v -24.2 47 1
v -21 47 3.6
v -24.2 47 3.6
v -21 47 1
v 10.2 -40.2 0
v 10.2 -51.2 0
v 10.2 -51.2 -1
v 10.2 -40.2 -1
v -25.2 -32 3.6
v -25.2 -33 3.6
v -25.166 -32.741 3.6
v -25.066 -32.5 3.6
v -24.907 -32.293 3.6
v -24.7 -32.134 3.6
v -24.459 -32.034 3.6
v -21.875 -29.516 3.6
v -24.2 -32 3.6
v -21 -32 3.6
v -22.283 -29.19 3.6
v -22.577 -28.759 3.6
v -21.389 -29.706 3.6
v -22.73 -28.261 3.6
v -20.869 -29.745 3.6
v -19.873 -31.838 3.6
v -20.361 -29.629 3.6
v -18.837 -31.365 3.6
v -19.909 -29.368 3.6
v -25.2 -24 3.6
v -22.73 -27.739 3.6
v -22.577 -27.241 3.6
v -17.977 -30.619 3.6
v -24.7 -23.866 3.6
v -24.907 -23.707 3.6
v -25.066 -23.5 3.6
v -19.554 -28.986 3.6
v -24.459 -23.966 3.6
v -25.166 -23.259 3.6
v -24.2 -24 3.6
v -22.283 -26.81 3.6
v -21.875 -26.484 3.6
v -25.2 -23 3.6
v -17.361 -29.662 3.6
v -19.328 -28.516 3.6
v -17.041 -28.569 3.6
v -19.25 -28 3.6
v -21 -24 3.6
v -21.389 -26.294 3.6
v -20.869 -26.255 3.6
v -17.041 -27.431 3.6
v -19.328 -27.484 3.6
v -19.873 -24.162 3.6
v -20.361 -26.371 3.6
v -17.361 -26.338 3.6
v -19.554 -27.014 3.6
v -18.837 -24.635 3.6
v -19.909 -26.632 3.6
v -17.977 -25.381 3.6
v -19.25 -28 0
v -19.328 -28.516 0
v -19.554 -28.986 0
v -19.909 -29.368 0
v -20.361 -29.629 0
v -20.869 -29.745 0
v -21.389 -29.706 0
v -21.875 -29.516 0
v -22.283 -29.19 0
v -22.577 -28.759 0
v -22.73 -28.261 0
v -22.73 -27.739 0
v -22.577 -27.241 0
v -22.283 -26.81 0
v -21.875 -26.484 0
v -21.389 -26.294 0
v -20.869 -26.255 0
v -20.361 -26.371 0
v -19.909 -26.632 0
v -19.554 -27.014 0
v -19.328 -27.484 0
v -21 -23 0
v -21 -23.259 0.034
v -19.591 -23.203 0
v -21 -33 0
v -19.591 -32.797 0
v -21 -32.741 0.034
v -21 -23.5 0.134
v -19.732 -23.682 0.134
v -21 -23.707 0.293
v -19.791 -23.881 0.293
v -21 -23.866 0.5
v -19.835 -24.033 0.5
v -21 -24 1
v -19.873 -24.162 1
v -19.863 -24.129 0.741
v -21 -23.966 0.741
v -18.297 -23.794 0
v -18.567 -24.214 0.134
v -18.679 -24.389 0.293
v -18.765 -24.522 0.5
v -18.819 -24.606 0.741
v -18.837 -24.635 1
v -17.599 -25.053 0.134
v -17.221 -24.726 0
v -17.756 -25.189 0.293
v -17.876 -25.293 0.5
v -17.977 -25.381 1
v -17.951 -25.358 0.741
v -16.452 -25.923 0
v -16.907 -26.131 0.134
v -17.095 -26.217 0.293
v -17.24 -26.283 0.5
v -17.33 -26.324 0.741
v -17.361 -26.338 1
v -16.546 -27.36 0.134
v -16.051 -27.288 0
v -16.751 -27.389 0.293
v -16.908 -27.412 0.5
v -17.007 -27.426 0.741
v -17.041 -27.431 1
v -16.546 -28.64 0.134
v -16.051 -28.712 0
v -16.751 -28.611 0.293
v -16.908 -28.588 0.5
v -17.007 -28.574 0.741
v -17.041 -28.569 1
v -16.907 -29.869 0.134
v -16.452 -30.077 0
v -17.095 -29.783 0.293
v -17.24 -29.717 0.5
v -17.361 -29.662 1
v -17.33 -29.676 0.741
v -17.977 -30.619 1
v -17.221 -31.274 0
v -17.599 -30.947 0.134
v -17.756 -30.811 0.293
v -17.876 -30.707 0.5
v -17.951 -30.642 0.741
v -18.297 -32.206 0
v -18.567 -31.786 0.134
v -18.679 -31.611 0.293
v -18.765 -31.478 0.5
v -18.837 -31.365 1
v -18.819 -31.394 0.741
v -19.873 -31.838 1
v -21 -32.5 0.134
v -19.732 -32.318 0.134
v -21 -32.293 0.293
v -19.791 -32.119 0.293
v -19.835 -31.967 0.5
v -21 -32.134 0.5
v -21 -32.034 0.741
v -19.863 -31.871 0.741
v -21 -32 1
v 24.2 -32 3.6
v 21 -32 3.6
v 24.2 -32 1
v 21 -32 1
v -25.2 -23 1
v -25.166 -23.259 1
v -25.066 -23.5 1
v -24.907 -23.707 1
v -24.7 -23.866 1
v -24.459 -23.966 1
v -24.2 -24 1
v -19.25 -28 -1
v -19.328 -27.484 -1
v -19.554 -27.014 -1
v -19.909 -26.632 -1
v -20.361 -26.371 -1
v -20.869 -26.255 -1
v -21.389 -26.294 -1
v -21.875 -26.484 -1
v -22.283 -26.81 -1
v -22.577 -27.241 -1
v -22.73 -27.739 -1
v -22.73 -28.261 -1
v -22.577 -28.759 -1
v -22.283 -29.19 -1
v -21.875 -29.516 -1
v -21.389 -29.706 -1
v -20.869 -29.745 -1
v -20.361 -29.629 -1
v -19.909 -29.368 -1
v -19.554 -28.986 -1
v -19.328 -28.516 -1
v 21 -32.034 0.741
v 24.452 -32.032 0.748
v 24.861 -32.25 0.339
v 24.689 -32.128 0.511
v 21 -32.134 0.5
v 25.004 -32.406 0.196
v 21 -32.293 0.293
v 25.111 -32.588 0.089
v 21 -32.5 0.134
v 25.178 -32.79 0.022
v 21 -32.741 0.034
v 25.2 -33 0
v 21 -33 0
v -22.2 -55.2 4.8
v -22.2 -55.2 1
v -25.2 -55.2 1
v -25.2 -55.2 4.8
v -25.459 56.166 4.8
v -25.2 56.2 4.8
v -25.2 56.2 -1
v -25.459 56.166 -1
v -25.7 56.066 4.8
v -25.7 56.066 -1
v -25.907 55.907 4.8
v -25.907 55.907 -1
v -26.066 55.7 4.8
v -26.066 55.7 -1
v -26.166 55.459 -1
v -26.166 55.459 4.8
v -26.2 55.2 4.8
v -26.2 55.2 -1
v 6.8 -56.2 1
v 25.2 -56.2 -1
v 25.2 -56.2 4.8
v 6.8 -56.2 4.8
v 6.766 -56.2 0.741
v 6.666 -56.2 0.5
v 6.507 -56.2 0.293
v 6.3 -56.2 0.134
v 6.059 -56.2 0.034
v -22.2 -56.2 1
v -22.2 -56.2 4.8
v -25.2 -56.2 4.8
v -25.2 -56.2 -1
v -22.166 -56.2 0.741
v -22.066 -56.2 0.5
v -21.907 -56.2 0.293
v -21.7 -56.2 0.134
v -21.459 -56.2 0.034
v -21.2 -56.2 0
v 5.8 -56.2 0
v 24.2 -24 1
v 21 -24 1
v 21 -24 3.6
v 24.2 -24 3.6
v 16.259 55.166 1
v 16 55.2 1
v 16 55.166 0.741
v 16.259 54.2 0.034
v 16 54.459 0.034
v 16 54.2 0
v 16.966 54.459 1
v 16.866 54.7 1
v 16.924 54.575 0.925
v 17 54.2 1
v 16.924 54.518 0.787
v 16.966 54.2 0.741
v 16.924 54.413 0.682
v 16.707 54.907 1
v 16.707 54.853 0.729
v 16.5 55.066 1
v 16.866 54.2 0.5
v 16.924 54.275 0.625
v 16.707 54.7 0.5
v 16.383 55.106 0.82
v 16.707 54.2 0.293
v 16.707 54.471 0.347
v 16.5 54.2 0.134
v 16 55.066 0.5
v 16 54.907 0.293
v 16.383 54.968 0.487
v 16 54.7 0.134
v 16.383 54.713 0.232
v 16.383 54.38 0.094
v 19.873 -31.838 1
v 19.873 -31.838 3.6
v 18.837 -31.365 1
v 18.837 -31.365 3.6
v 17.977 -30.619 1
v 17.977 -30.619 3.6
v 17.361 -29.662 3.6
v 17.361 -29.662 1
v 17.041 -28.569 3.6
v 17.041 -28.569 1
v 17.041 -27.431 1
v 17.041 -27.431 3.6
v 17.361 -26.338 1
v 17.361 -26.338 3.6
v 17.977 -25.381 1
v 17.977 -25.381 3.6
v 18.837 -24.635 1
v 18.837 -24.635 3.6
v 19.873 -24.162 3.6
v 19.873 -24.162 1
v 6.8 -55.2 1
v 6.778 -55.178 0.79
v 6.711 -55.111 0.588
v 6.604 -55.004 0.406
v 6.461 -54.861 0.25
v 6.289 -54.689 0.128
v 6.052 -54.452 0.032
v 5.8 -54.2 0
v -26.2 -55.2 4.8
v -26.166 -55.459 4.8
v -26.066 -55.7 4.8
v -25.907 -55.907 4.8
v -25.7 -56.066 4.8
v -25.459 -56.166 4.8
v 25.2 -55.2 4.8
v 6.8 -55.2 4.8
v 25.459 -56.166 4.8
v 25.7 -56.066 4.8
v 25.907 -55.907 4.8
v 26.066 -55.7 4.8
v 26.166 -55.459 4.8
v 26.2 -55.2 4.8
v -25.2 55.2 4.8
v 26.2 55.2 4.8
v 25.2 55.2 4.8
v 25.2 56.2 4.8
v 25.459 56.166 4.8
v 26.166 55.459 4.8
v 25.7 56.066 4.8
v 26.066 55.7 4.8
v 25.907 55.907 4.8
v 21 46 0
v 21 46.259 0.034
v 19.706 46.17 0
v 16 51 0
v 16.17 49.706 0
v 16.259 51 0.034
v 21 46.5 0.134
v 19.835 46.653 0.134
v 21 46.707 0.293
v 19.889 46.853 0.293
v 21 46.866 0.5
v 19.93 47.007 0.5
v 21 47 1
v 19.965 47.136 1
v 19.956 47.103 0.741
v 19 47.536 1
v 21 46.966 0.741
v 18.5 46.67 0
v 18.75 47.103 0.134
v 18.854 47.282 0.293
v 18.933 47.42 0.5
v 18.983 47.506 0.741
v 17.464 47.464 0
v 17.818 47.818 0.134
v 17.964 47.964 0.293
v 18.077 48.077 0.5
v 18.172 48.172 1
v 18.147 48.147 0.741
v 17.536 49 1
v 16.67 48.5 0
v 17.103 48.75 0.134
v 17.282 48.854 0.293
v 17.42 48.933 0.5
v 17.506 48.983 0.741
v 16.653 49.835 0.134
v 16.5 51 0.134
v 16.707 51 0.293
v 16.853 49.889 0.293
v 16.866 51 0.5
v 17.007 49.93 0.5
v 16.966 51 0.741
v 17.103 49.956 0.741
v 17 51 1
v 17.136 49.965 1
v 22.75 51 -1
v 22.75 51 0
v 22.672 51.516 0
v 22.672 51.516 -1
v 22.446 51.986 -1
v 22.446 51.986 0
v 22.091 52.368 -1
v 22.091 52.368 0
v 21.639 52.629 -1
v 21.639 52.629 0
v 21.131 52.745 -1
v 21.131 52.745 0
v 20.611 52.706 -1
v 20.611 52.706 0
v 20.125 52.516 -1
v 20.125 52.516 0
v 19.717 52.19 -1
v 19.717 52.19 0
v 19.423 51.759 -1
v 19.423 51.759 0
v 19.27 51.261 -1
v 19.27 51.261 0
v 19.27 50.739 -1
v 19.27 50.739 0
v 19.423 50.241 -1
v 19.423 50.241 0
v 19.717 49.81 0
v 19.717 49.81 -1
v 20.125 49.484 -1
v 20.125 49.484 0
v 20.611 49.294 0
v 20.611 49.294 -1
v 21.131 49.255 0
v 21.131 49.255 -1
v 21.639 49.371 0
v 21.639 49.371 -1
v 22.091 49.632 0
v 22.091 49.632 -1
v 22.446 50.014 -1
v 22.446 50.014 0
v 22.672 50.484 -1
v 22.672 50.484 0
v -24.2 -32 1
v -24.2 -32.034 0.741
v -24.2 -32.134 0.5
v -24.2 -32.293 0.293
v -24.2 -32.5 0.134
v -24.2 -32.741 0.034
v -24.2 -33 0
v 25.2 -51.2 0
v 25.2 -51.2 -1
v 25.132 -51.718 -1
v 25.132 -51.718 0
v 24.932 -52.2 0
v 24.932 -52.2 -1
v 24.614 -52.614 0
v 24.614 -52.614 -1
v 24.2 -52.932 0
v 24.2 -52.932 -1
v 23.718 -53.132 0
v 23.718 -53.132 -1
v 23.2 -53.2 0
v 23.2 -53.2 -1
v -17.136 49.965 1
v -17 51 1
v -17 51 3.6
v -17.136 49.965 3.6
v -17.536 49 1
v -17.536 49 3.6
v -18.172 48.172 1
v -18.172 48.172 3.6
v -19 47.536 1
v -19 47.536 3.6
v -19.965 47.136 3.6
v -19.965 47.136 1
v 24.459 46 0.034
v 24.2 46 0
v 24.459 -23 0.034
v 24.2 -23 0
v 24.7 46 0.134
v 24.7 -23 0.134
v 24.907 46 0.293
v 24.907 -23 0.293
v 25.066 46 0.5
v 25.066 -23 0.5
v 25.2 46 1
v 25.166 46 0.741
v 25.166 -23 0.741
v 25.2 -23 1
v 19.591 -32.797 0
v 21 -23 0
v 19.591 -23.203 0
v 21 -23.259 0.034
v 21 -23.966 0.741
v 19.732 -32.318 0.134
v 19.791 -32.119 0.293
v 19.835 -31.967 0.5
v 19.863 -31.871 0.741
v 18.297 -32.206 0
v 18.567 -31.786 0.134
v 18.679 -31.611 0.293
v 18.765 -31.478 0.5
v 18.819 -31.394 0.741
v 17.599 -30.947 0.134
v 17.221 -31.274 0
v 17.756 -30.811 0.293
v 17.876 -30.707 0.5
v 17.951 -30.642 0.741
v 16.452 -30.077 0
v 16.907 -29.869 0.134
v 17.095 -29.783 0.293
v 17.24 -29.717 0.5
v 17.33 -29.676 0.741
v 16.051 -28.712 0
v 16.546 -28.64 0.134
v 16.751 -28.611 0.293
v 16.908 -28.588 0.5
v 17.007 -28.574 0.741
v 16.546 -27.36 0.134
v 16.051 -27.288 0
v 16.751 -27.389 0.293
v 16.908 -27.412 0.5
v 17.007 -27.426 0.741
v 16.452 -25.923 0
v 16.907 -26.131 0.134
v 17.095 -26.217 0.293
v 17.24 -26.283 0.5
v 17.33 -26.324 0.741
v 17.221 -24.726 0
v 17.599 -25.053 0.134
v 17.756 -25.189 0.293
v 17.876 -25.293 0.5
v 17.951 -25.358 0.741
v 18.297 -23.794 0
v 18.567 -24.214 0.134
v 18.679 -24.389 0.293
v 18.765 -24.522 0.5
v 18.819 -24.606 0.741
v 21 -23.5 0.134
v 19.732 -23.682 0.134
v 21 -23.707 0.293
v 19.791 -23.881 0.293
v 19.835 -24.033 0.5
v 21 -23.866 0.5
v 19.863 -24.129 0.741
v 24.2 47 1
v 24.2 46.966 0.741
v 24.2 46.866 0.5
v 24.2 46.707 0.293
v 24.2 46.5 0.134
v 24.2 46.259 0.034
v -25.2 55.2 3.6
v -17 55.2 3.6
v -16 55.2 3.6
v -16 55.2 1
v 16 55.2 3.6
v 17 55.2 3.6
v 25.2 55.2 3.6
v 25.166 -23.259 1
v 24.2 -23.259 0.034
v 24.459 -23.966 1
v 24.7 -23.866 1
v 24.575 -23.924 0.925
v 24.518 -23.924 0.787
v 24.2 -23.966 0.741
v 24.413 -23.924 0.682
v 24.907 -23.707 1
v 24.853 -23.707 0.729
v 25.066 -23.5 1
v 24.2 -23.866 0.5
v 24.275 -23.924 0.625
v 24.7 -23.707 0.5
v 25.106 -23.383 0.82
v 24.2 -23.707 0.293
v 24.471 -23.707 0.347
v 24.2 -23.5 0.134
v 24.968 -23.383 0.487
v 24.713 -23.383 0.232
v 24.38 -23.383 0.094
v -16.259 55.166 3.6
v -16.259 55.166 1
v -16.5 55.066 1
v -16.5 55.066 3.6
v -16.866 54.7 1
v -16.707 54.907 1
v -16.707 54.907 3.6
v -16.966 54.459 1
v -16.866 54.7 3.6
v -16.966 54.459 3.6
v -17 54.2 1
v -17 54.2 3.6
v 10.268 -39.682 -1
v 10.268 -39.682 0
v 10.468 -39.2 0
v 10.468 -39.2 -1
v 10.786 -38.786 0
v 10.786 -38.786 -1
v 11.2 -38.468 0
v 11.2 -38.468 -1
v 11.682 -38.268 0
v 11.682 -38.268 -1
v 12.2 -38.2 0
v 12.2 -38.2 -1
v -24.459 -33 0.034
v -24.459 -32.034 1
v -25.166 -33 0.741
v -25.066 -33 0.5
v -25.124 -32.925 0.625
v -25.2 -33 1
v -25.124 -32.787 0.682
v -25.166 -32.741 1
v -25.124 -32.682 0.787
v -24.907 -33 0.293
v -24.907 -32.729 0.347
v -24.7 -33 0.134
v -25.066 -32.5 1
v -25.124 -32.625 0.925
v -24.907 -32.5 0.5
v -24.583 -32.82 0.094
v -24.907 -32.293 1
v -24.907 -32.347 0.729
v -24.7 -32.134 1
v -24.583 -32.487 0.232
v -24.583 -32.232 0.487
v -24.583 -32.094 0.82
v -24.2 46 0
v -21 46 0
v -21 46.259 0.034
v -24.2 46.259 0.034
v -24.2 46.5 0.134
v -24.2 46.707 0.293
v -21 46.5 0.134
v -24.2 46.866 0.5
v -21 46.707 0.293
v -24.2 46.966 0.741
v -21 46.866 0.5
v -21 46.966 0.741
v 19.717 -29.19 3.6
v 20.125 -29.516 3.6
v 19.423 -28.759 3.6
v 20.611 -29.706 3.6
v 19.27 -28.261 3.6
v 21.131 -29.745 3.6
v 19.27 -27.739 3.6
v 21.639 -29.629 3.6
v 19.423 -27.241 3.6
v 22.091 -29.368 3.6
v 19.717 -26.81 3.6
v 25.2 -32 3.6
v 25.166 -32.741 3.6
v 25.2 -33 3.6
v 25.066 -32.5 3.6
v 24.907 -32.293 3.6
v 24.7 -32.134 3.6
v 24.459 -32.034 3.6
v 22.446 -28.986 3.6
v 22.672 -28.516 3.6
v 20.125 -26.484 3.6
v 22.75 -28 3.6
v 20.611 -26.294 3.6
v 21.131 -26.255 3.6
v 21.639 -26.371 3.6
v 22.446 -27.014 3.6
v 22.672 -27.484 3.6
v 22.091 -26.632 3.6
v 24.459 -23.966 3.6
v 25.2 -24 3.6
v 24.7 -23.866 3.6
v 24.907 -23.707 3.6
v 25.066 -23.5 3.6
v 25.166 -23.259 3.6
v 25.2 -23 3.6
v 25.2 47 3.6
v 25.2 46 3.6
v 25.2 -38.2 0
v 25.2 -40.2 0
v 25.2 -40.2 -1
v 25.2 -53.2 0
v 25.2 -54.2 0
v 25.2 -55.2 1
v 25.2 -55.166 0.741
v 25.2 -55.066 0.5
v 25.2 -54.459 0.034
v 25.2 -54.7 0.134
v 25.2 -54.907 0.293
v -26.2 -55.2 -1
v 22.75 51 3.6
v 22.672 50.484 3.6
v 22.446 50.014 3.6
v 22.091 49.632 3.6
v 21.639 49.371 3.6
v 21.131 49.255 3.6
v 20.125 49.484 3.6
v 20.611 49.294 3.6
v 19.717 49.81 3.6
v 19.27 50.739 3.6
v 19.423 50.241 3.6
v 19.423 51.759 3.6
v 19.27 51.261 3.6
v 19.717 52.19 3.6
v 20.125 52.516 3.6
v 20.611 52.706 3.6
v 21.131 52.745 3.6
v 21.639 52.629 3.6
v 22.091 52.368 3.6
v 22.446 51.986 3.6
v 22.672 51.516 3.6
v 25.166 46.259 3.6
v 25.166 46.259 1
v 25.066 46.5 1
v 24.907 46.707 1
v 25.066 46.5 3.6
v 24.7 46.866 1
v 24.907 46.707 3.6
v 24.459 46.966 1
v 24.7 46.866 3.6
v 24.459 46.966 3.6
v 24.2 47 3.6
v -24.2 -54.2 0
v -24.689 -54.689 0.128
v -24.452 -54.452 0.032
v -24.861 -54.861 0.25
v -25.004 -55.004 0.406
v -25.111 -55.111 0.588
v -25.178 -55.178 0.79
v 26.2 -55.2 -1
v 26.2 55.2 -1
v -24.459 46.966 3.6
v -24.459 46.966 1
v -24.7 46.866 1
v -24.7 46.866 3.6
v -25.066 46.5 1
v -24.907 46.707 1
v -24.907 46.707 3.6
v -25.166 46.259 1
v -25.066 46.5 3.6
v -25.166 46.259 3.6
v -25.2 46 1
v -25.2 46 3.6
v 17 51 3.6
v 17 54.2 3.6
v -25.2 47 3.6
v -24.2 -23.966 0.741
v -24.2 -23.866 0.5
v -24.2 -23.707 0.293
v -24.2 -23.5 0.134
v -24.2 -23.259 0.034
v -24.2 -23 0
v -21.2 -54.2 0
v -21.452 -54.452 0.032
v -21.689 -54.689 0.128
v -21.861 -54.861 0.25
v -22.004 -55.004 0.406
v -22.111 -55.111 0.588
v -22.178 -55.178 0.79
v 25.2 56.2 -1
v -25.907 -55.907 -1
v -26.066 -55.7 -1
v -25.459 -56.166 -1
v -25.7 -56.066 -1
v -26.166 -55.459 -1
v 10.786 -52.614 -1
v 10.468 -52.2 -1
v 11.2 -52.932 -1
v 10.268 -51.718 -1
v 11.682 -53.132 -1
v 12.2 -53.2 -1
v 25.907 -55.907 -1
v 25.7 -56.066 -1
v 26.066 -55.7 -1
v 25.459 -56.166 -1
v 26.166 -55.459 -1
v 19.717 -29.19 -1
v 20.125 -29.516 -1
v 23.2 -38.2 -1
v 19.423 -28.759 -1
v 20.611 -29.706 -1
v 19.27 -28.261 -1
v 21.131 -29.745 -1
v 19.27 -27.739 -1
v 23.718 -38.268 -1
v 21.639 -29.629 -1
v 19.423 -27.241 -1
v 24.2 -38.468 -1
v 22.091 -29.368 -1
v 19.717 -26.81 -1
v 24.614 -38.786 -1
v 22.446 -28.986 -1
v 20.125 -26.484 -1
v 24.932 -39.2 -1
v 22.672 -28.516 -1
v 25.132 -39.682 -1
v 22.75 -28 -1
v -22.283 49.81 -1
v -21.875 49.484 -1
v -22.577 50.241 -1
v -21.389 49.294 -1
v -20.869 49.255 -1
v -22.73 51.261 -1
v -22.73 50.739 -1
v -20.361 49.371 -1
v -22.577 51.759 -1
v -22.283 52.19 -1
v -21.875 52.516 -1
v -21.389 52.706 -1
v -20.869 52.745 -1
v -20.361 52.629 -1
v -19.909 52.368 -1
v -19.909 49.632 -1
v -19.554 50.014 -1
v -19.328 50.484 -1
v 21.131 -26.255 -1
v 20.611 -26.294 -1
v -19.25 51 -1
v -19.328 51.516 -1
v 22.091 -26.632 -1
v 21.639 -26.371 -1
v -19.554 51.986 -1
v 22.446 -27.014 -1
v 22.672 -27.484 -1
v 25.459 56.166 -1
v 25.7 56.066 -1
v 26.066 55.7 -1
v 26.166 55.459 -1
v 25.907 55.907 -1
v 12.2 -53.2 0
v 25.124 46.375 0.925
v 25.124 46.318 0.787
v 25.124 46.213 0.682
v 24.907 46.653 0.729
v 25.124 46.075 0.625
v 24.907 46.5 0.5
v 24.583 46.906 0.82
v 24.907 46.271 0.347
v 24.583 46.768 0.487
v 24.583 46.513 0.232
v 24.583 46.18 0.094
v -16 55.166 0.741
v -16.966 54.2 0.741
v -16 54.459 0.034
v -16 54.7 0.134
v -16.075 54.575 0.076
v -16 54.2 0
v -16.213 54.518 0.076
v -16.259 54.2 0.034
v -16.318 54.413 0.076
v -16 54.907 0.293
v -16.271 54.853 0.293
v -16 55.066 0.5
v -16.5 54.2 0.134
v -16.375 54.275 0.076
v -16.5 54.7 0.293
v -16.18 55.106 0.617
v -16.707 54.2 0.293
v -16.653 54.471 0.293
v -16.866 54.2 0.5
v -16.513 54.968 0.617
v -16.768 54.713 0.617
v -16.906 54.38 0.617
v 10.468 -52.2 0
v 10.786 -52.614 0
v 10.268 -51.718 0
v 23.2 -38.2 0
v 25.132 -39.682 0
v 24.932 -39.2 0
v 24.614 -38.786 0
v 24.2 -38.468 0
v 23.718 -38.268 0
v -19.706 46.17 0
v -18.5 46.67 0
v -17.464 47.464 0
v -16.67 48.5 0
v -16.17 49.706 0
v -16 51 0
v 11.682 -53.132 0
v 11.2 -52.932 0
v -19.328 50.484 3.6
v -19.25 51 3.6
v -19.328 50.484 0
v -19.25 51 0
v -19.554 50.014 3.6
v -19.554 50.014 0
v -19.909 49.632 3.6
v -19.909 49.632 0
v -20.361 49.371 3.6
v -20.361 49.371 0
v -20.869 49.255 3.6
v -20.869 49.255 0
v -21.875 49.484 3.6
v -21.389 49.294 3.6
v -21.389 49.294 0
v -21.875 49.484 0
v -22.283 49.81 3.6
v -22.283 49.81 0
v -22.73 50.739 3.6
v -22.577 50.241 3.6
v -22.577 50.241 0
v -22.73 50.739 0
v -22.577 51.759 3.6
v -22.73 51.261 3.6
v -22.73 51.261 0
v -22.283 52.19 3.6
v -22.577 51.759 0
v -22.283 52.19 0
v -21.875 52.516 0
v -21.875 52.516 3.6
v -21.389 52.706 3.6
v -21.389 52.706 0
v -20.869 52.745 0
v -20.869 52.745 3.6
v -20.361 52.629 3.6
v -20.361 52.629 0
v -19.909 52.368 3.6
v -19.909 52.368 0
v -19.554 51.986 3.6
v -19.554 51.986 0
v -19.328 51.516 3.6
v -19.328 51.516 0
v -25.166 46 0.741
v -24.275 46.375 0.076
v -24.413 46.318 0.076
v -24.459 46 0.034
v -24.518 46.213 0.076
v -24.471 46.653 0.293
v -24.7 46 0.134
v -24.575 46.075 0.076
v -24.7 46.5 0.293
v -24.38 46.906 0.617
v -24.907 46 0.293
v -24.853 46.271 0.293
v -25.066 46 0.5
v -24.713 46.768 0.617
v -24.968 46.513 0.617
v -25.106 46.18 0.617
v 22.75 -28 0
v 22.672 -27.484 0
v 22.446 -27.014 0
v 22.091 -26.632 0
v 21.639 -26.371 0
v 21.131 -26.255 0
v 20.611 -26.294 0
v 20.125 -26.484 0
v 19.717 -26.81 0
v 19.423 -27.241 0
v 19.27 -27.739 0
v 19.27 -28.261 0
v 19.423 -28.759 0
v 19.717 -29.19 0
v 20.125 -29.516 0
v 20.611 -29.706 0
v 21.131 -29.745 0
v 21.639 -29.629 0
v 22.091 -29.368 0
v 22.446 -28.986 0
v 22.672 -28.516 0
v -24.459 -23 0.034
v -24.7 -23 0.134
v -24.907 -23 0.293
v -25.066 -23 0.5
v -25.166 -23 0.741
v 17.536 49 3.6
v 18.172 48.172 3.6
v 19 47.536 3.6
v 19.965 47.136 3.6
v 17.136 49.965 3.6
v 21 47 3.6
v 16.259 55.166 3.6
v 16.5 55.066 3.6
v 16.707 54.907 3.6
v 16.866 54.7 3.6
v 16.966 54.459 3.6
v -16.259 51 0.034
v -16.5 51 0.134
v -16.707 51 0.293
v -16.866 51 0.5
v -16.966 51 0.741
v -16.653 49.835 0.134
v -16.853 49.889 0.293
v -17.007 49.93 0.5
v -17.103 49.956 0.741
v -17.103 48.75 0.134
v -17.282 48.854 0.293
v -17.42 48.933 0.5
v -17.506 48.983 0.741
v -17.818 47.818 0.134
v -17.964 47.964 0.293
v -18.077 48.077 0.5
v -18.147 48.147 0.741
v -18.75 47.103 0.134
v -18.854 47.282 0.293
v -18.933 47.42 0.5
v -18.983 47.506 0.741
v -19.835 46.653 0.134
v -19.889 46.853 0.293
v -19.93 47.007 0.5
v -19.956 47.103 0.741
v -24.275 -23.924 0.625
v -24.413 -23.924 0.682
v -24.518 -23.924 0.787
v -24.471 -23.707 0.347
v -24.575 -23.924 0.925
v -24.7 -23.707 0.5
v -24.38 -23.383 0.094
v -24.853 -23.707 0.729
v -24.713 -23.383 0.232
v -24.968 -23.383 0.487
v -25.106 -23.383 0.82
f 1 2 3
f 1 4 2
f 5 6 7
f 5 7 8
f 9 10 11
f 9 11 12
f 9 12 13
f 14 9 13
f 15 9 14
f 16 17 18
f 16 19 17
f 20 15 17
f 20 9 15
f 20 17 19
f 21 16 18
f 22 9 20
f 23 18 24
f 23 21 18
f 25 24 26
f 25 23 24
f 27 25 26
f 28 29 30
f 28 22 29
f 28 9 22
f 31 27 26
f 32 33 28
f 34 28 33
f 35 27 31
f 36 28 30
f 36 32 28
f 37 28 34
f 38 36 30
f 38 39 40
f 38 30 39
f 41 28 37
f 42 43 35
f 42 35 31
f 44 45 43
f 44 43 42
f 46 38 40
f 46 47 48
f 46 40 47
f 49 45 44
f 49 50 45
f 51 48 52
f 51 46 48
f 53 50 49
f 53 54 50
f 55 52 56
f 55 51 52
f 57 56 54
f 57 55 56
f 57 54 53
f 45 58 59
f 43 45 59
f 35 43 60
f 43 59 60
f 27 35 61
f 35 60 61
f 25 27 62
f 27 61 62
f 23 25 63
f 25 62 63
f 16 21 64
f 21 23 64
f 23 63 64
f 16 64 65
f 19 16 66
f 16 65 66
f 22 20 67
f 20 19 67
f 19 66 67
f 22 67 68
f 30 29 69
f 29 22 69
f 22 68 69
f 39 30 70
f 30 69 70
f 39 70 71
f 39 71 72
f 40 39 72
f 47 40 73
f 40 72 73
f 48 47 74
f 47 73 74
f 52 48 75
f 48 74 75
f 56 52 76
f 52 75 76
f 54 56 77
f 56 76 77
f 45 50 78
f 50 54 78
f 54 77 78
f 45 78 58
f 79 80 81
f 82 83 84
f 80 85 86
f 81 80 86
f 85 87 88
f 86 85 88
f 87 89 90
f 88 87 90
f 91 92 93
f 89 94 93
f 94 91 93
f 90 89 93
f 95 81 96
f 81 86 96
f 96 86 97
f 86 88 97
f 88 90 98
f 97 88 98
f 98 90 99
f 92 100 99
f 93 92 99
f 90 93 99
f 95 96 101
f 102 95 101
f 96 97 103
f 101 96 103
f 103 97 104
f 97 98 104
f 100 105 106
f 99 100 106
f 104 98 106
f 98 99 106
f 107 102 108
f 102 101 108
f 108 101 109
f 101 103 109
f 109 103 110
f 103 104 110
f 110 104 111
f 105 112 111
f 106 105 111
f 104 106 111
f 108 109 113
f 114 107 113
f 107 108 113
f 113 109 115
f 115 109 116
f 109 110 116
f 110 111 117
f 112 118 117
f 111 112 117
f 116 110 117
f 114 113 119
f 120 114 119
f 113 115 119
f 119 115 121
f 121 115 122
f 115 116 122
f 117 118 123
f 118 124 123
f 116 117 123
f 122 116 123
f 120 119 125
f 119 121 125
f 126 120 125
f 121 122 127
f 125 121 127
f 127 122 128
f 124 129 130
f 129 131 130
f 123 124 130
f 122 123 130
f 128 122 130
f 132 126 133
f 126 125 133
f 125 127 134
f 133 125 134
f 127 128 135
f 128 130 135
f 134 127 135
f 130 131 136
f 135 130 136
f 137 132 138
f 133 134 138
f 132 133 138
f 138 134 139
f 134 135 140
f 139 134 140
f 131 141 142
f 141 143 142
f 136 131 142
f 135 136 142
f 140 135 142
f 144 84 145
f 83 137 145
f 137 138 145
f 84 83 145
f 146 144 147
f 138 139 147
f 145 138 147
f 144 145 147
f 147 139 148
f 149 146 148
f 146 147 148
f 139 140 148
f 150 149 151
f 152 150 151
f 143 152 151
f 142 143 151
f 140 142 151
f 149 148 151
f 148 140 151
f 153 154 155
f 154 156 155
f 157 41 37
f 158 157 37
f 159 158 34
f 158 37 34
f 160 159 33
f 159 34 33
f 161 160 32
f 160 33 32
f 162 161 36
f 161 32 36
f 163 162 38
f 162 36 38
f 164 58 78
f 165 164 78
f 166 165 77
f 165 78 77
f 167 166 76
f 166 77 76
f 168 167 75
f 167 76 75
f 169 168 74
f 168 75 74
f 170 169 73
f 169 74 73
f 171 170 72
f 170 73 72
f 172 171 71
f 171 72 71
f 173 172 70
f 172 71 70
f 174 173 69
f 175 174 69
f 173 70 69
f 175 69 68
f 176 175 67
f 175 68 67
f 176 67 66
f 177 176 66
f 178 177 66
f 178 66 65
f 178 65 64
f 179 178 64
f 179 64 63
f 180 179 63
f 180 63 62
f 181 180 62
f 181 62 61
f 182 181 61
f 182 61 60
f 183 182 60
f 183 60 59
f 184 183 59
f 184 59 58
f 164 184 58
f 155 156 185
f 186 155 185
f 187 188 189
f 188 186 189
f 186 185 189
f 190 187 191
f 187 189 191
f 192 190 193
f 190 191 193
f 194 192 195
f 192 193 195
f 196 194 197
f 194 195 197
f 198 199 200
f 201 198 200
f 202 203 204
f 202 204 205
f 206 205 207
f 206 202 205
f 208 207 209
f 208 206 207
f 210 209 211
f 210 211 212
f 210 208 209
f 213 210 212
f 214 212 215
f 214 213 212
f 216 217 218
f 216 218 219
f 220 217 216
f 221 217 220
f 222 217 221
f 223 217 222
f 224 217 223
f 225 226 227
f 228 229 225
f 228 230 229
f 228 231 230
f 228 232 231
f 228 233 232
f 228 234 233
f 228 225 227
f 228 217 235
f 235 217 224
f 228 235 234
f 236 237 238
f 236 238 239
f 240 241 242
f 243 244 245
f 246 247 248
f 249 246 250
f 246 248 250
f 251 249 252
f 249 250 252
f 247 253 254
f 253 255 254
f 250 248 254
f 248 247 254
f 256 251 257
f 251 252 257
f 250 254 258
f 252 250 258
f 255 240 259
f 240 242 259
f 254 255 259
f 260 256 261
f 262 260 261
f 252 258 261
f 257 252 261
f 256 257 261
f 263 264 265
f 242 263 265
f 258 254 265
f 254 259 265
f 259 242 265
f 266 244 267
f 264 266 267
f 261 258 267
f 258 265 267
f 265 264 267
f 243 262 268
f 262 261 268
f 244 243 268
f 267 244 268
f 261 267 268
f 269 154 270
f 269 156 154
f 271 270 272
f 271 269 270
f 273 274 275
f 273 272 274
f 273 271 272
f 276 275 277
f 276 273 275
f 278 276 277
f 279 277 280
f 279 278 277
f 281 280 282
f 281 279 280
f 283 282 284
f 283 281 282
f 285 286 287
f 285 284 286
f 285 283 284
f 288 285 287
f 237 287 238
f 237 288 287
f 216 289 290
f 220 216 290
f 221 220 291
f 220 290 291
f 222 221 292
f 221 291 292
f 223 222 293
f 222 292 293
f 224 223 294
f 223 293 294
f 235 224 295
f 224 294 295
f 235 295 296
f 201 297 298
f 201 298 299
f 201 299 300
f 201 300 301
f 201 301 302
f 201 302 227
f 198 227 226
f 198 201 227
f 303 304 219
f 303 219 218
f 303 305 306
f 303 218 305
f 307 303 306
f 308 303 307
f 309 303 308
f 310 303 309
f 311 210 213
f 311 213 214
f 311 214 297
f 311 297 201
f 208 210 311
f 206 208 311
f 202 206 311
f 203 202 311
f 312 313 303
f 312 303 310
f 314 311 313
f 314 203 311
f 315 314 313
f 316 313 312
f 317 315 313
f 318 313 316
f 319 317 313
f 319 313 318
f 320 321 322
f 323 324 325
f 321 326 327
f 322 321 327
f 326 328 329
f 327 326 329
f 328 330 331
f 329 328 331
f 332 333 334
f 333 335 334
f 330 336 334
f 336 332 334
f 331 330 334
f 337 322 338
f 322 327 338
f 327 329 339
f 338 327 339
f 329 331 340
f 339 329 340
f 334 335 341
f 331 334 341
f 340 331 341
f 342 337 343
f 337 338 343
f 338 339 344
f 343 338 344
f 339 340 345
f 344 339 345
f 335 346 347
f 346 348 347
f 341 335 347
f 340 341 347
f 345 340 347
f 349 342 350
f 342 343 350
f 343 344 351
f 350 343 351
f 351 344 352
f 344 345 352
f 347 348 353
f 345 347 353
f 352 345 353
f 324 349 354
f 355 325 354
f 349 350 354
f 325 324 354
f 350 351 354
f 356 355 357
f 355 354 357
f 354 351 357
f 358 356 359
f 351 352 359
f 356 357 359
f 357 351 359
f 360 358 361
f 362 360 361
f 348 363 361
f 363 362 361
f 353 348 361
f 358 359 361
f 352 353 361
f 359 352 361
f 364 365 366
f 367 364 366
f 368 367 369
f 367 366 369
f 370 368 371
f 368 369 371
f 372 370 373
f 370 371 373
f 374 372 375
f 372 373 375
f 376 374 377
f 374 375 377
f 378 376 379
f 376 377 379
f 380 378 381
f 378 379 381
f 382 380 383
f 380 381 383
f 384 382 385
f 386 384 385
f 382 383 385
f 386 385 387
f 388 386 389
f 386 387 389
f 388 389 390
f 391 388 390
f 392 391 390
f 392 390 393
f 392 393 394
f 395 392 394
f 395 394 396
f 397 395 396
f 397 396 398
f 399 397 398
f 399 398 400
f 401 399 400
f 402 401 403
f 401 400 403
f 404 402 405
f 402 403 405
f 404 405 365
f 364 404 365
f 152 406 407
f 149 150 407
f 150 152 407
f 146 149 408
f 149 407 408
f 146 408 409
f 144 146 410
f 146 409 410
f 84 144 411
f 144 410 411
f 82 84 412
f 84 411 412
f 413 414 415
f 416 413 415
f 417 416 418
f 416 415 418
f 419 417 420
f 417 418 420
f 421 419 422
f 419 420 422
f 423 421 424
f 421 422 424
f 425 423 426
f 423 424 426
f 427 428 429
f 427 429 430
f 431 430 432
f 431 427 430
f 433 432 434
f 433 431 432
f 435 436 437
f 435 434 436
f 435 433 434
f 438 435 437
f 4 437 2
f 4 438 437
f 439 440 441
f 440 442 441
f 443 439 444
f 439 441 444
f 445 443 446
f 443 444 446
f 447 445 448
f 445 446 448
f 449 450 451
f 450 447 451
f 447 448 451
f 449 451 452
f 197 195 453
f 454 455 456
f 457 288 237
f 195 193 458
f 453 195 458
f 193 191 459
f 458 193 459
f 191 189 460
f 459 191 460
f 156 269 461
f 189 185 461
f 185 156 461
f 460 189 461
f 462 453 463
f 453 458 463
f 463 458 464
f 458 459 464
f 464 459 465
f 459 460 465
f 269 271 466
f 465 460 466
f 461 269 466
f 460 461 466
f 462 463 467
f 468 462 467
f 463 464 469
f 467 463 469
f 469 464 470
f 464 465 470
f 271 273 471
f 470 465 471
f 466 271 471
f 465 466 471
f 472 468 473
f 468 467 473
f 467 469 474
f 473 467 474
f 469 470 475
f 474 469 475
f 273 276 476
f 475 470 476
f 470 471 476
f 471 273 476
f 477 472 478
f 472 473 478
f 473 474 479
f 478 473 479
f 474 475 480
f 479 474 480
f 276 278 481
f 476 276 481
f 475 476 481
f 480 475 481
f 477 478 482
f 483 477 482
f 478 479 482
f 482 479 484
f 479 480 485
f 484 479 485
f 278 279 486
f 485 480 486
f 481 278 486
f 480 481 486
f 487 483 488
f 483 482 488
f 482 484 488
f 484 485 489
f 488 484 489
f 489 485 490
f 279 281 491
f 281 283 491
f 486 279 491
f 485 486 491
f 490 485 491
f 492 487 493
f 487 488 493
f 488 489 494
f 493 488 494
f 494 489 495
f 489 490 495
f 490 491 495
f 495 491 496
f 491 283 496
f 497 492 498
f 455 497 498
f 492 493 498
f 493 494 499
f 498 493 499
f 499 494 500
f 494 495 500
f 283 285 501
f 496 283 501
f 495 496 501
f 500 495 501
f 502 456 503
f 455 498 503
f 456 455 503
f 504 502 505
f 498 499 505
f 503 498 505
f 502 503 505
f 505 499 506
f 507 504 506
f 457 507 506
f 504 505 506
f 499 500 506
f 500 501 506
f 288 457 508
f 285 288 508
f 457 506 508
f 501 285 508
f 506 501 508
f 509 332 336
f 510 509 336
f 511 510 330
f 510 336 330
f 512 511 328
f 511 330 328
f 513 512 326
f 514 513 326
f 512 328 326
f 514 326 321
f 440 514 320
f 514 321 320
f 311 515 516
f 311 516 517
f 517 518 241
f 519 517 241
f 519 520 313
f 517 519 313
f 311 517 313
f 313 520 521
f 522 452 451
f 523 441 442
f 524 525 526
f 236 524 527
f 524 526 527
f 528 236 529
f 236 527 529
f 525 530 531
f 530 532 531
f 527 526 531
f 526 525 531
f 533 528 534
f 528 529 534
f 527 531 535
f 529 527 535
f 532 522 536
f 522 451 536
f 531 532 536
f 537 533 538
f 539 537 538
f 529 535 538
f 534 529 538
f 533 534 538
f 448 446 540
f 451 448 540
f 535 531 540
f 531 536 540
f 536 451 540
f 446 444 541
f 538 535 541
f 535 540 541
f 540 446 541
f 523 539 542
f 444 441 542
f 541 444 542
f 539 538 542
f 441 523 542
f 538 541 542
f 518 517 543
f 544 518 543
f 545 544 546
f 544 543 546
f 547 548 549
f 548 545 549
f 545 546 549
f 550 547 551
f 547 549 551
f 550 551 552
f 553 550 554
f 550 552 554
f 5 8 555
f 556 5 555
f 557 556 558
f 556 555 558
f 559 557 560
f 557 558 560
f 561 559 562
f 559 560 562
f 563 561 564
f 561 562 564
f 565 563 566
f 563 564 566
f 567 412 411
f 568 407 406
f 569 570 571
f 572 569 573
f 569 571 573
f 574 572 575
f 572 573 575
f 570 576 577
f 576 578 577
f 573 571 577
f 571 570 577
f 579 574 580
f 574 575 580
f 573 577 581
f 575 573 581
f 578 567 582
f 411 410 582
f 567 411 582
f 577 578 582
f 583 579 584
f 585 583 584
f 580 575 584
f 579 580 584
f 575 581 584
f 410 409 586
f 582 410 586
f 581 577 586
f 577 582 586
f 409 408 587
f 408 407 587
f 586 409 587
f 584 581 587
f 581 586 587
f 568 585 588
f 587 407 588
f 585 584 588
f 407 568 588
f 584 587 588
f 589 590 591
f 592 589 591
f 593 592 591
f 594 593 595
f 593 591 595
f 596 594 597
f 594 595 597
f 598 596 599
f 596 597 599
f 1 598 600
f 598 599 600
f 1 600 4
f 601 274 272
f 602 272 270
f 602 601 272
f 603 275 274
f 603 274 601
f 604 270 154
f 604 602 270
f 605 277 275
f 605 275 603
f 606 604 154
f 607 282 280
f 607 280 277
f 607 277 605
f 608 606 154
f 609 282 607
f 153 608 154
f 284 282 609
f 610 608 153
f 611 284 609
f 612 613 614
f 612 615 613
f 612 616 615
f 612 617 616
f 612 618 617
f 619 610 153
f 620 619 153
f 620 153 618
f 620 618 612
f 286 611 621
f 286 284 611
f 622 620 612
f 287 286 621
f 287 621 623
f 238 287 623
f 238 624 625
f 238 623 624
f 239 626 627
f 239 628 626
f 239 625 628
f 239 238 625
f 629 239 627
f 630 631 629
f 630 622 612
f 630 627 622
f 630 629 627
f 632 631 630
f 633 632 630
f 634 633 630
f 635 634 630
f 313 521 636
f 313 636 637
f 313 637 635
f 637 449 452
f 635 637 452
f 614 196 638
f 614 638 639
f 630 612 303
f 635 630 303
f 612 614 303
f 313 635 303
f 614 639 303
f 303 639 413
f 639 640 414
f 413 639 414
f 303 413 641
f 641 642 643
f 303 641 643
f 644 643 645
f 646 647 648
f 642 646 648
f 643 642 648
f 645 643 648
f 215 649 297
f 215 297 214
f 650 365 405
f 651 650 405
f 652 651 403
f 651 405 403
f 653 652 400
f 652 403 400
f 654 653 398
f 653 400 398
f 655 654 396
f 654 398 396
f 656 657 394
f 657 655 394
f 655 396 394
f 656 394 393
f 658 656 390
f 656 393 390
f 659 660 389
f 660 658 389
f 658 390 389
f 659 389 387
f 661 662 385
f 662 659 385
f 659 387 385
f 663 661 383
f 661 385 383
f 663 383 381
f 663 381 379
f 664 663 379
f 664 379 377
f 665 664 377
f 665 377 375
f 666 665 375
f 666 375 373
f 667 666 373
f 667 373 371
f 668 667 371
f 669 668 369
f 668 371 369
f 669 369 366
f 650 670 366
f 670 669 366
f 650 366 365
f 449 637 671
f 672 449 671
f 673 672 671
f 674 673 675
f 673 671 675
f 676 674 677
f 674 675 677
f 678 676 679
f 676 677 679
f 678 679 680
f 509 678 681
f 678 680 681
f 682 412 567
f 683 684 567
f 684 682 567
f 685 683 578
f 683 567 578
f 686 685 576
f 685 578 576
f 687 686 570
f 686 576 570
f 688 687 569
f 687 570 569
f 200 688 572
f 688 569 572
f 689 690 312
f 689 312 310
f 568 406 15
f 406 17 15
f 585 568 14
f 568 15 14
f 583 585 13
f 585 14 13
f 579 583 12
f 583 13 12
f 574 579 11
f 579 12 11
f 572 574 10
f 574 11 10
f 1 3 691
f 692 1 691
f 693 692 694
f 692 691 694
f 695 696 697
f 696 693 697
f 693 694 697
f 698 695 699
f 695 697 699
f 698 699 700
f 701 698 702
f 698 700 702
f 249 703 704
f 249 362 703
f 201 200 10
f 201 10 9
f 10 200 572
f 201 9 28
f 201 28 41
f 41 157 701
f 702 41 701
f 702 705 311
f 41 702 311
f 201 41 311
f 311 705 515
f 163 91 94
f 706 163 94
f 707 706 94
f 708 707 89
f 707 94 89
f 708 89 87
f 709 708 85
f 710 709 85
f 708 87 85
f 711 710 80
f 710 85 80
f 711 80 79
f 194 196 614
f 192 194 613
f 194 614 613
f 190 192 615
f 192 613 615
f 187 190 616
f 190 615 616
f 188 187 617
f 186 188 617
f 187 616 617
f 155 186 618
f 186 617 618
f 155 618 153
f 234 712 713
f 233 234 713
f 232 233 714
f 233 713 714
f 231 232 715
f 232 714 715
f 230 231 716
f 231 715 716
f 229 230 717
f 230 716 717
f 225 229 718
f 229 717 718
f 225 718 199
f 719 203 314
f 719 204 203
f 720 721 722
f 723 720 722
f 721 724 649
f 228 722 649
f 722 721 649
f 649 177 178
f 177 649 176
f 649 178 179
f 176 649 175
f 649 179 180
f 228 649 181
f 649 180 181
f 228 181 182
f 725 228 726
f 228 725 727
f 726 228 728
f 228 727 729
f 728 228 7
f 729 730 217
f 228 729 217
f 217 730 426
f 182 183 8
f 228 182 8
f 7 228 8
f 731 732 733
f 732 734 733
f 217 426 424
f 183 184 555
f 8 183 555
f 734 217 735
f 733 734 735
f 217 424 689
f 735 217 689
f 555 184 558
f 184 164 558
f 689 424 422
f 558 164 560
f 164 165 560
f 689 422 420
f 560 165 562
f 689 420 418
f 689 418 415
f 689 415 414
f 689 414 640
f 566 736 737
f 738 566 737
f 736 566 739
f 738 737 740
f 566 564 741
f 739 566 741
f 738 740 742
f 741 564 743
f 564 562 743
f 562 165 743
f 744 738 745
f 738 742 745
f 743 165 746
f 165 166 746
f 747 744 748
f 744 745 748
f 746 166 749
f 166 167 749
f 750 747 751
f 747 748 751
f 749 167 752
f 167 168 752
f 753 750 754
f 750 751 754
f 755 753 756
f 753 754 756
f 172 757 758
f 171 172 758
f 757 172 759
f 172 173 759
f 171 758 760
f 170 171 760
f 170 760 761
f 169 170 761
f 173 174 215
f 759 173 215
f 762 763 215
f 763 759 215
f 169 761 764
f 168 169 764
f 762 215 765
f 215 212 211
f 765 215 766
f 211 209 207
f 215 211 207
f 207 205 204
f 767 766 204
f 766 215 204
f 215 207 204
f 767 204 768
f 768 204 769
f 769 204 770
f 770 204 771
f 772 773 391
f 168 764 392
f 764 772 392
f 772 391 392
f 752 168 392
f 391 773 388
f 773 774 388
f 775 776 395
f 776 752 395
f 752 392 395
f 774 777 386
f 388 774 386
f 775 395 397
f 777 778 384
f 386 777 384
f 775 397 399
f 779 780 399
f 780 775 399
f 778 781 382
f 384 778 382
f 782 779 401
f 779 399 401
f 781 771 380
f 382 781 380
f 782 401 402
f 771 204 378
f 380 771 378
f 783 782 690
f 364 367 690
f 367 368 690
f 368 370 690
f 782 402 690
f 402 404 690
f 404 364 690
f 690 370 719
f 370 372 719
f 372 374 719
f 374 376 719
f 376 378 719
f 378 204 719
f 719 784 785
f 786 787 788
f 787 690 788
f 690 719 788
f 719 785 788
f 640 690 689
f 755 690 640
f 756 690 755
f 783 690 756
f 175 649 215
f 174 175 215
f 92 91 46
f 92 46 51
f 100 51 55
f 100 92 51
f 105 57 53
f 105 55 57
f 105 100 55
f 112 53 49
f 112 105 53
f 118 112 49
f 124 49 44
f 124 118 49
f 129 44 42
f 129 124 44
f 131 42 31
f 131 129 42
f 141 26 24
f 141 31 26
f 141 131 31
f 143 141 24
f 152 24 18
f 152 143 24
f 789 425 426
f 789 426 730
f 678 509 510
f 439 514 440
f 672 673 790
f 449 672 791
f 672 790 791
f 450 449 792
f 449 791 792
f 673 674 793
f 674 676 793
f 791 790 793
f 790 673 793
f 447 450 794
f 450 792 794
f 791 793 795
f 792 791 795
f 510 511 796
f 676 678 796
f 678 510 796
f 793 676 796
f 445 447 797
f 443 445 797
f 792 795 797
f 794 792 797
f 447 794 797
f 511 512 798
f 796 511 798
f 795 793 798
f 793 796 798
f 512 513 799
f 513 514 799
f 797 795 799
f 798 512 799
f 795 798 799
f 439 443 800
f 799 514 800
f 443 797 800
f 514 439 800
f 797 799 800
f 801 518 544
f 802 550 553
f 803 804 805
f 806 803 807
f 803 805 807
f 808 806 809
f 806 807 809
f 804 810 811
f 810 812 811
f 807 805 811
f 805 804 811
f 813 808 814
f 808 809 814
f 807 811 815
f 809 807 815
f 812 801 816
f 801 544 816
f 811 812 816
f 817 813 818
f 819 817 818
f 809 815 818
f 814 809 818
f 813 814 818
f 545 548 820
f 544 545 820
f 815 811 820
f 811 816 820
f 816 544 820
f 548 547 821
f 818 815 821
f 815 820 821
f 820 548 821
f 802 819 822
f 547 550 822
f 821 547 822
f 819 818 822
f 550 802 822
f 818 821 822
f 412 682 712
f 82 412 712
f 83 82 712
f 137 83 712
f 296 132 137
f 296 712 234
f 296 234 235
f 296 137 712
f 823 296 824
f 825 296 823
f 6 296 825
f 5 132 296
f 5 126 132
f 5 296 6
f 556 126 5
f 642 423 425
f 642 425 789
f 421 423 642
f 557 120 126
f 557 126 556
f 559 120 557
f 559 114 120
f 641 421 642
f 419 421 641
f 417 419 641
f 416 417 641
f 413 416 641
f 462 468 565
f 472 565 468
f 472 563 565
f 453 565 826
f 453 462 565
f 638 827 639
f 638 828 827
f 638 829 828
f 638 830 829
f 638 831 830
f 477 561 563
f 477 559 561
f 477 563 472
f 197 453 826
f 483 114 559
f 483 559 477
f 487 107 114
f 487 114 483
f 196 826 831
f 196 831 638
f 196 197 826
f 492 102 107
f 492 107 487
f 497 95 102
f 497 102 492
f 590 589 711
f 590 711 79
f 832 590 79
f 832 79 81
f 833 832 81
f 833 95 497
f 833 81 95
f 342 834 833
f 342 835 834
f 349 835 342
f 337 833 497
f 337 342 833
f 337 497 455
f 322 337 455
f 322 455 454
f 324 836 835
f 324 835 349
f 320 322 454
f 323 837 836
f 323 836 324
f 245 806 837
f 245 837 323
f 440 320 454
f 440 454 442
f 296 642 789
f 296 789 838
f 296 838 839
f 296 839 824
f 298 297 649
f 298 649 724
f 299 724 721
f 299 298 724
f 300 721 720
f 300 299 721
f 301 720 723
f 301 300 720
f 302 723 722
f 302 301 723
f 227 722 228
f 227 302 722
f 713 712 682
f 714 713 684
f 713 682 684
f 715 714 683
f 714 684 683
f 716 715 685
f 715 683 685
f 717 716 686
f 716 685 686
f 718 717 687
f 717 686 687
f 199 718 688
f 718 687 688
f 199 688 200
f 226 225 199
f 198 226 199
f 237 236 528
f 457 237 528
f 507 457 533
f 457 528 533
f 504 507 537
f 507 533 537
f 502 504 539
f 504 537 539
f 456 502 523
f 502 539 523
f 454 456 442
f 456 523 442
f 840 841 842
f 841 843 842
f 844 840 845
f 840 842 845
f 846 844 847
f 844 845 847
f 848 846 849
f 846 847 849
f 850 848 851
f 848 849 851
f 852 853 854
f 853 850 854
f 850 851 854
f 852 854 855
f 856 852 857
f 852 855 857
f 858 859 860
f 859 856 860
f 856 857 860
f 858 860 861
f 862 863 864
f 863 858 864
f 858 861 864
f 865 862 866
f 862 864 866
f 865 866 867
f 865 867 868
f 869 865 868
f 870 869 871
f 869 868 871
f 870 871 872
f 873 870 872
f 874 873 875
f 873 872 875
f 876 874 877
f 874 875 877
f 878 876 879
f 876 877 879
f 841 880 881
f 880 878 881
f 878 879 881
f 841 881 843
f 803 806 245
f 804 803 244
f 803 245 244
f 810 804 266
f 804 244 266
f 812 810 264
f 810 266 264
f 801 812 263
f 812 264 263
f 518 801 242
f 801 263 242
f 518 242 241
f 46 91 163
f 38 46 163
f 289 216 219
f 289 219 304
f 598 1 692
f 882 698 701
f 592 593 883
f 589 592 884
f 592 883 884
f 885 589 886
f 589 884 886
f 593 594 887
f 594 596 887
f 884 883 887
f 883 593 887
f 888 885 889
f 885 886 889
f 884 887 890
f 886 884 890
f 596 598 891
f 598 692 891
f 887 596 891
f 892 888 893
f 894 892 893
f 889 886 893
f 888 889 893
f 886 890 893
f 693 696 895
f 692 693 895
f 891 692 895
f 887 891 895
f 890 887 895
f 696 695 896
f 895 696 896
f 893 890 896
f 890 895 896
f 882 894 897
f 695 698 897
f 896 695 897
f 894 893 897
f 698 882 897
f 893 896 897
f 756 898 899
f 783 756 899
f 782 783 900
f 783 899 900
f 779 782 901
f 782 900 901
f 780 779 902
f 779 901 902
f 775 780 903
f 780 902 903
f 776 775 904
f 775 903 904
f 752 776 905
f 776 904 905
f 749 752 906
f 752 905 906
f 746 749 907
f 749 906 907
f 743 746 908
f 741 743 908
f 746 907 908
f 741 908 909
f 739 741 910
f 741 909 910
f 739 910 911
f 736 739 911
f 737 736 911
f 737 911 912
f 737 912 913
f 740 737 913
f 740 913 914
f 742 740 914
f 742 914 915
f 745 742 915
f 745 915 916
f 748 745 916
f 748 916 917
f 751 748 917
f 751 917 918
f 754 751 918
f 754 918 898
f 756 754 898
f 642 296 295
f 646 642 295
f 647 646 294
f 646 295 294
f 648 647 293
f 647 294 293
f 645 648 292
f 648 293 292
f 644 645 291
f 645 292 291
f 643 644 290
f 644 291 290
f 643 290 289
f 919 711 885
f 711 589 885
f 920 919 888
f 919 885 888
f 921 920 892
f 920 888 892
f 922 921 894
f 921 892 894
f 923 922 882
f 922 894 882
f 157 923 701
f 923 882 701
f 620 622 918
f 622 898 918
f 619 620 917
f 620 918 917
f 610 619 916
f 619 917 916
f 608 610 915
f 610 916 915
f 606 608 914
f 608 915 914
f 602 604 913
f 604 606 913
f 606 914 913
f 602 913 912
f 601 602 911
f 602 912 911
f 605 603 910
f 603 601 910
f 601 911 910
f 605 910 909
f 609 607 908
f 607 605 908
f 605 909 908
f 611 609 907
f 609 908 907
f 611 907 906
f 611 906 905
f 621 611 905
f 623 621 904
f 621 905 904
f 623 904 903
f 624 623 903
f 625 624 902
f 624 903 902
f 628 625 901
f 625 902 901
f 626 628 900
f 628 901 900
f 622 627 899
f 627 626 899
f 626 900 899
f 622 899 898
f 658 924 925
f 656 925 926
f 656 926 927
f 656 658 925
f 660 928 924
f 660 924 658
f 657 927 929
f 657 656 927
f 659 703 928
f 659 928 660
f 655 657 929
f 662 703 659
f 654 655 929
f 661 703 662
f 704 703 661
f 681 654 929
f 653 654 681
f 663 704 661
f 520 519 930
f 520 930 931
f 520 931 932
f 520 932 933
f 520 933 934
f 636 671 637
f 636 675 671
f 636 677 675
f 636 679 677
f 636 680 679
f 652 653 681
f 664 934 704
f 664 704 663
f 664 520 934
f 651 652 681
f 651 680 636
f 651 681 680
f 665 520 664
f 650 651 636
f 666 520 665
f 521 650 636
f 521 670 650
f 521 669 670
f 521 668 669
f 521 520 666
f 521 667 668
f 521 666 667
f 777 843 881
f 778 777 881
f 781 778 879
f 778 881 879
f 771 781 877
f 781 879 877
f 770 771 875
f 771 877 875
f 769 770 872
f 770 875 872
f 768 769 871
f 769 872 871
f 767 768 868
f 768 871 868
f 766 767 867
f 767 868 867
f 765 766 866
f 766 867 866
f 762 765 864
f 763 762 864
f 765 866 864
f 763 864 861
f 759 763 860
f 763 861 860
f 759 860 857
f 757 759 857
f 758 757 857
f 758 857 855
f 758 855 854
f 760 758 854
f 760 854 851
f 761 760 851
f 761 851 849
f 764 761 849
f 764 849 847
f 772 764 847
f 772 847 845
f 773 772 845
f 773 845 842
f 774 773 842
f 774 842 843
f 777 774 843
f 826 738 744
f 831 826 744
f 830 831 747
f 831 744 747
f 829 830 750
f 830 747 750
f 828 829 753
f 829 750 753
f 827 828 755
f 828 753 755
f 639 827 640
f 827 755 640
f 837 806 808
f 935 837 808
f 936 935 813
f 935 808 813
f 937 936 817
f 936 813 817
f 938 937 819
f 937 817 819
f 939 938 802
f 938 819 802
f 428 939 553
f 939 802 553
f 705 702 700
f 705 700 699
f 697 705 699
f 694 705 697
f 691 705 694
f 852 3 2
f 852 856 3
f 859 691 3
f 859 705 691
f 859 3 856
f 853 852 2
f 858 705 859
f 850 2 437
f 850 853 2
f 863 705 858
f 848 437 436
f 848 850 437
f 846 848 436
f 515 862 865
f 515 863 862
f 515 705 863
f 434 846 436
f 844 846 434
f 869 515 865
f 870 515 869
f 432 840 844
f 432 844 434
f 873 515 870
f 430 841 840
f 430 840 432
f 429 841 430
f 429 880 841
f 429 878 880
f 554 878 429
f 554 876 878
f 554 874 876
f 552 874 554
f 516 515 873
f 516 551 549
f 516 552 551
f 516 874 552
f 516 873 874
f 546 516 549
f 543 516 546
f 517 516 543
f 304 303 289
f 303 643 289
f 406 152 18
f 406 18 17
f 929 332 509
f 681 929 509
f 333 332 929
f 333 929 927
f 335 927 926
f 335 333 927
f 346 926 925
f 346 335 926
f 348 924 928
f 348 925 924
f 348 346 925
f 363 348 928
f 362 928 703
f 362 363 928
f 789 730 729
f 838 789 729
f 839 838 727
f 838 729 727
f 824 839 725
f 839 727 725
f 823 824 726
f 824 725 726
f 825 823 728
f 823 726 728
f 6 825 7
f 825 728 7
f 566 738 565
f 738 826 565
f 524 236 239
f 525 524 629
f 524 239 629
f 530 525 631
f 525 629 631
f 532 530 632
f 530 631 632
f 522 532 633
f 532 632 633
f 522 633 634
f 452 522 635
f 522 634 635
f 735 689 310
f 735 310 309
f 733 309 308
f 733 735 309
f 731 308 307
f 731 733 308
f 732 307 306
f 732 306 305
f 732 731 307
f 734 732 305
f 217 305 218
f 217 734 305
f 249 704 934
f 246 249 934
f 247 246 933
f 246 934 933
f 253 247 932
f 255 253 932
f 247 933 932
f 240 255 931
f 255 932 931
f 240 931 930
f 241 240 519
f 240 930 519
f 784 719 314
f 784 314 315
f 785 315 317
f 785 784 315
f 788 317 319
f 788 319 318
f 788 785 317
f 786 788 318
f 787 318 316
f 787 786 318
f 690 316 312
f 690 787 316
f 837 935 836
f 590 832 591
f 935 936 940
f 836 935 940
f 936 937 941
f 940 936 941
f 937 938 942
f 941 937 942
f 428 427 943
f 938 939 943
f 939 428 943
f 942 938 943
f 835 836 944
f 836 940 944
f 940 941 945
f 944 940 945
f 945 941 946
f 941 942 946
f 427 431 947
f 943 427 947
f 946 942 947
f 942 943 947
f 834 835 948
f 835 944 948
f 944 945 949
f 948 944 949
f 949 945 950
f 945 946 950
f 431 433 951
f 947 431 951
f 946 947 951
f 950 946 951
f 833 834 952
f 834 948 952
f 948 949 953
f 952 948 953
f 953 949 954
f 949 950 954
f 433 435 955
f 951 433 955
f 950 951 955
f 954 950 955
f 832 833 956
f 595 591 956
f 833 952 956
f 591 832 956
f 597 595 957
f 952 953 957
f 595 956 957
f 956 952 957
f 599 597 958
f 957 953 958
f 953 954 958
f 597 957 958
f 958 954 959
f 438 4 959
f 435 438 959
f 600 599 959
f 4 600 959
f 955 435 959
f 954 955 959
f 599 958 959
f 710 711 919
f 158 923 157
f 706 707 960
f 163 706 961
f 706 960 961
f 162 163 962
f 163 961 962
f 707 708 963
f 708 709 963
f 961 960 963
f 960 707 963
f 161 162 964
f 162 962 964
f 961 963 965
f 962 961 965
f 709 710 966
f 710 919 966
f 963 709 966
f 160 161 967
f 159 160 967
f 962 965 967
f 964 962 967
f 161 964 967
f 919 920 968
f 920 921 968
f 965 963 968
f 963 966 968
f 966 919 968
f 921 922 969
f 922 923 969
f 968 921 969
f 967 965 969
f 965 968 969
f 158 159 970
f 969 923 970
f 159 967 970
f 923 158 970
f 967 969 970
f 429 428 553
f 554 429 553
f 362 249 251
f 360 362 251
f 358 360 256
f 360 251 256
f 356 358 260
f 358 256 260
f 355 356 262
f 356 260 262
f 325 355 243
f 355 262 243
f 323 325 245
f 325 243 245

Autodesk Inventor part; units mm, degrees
ref_plane "YZ Plane" through (0, 0, 0) normal (1, 0, 0) x (0, 1, 0)
ref_plane "XZ Plane" through (0, 0, 0) normal (0, 1, 0) x (-1, 0, 0)
ref_plane "XY Plane" through (0, 0, 0) normal (0, 0, 1) x (1, 0, 0)
sketch "スケッチ1" plane through (0, 0, 0) normal (0, 0, 1) x (1, 0, 0)
  line L0 (-26.2, 56.2) -> (26.2, 56.2)
  line L1 (26.2, 56.2) -> (26.2, -56.2)
  line L2 (26.2, -56.2) -> (-26.2, -56.2)
  line L3 (-26.2, -56.2) -> (-26.2, 56.2)
  line L4 (-26.2, 56.2) -> (26.2, -56.2) construction
  line L5 (26.2, 56.2) -> (-26.2, -56.2) construction
  line L6 (-25.2, 55.2) -> (25.2, 55.2)
  line L7 (25.2, 55.2) -> (25.2, -55.2)
  line L8 (25.2, -55.2) -> (-25.2, -55.2)
  line L9 (-25.2, -55.2) -> (-25.2, 55.2)
  line L10 (-25.2, 55.2) -> (25.2, -55.2) construction
  line L11 (25.2, 55.2) -> (-25.2, -55.2) construction
  line L12 (-25, 55) -> (25, 55) construction
  line L13 (25, 55) -> (25, -55) construction
  line L14 (25, -55) -> (-25, -55) construction
  line L15 (-25, -55) -> (-25, 55) construction
  line L16 (-25, 55) -> (25, -55) construction
  line L17 (25, 55) -> (-25, -55) construction
  line L18 (-26.25, 56.25) -> (26.25, 56.25) construction
  line L19 (26.25, 56.25) -> (26.25, -56.25) construction
  line L20 (26.25, -56.25) -> (-26.25, -56.25) construction
  line L21 (-26.25, -56.25) -> (-26.25, 56.25) construction
  line L22 (-26.25, 56.25) -> (26.25, -56.25) construction
  line L23 (26.25, 56.25) -> (-26.25, -56.25) construction
  circle A0 centre (-21, 51) radius 1.75
  circle A1 centre (-21, -28) radius 1.75
  line L24 (0, 56.25) -> (0, -56.25) construction
  circle A2 centre (21, 51) radius 1.75
  circle A3 centre (21, -28) radius 1.75
  arc A4 (-21, -32) -> (-21, -24) centre (-21, -28) ccw
  line L25 (-21, 47) -> (-25.2, 47)
  line L26 (-17, 51) -> (-17, 55.2)
  arc A5 (-21, 47) -> (-17, 51) centre (-21, 51) ccw
  line L27 (-21, -24) -> (-25.2, -24)
  line L28 (-21, -32) -> (-25.2, -32)
  arc A6 (21, -24) -> (21, -32) centre (21, -28) ccw
  line L29 (21, 47) -> (25.2, 47)
  line L30 (17, 51) -> (17, 55.2)
  arc A7 (17, 51) -> (21, 47) centre (21, 51) ccw
  line L31 (21, -24) -> (25.2, -24)
  line L32 (21, -32) -> (25.2, -32)
  line L33 (25.2, -53.2) -> (25.2, -38.2)
  line L34 (25.2, -38.2) -> (10.2, -38.2)
  line L35 (25.2, -53.2) -> (10.2, -53.2)
  line L36 (10.2, -53.2) -> (10.2, -38.2)
  line L37 (-22.2, -56.2) -> (-22.2, -55.2)
  line L38 (6.8, -56.2) -> (6.8, -55.2)
  point P0 (0, 0)
  point P1 (-25.2, -38.2)
  dimension "d0" = 50
  dimension "d1" = 110
  dimension "d2" = 0.2
  dimension "d4" = 0.2
  dimension "d8" = 1
  dimension "d10" = 1
  dimension "d11" = 112.5
  dimension "d12" = 0.05
  dimension "d13" = 0.05
  dimension "d14" = 52.5
  dimension "d15" = 3.5
  dimension "d16" = 4
  dimension "d17" = 4
  dimension "d18" = 3.5
  dimension "d19" = 4
  dimension "d20" = 83
  dimension "d22" = 8
  dimension "d31" = 4
  dimension "d33" = 15
  dimension "d34" = 15
  dimension "d36" = 2
  dimension "d37" = 29
  dimension "d38" = 4
extrude "押し出し1" add sketch "スケッチ1" along normal blind 4.8 contours L0 L1 L2 L38 L8 L7 L6 L9 L37 L3
extrude "押し出し2" add sketch "スケッチ1" against normal blind 1 contours L0 L1 L2 L38 L8 L7 L6 L9 L37 L3 | L37 L8 L38 L2 | L8 L9 L28 A4 L27 L25 A5 L26 L6 L30 A7 L29 L7 L31 A6 L32 L34 L36 L35 | L9 L27 A4 L28 | L9 L6 L26 A5 L25 | L32 A6 L31 L7 | L29 A7 L30 L6 L7
extrude "押し出し3" add sketch "スケッチ1" along normal blind 3.6 contours L9 L27 A4 L28 | L9 L6 L26 A5 L25 | L32 A6 L31 L7 | L29 A7 L30 L6 L7
fillet "フィレット1" radius 1 4 edges at (-26.2, -56.2, 1.9) (26.2, -56.2, 1.9) (26.2, 56.2, 1.9) (-26.2, 56.2, 1.9)
fillet "フィレット2" radius 1 28 edges at (-25.2, 47, 1.8) (-17, 55.2, 1.8) (-25.2, 11.5, 0) (-18.1716, 48.1716, 0) (-17, 53.1, 0) (-23.1, 47, 0) (0, 55.2, 0) (17, 53.1, 0) (23.1, 47, 0) (18.1716, 48.1716, 0) (17, 55.2, 1.8) (25.2, 47, 1.8) (25.2, 11.5, 0) (25.2, -32, 1.8) (23.1, -24, 0) (23.1, -32, 0) (17, -28, 0) (-23.1, -32, 0) (-23.1, -24, 0) (-17, -28, 0) (16, -55.2, 0) (-23.7, -55.2, 0) (-25.2, -43.6, 0) (-25.2, -32, 1.8) (-25.2, -24, 1.8) (25.2, -24, 1.8) (-22.2, -55.7, 0) (6.8, -55.7, 0)
fillet "フィレット4" radius 2 4 edges at (10.2, -38.2, -0.5) (10.2, -53.2, -0.5) (25.2, -53.2, -0.5) (25.2, -38.2, -0.5)
equation "\"d4\" = d2"
equation "\"d13\" = d12"
equation "\"d17\" = d16"
equation "\"d18\" = d15"
equation "\"d19\" = d17"
equation "\"d22\" = 2 * d31"
properties part number "J120_cover" material "アセタール樹脂、黒"
